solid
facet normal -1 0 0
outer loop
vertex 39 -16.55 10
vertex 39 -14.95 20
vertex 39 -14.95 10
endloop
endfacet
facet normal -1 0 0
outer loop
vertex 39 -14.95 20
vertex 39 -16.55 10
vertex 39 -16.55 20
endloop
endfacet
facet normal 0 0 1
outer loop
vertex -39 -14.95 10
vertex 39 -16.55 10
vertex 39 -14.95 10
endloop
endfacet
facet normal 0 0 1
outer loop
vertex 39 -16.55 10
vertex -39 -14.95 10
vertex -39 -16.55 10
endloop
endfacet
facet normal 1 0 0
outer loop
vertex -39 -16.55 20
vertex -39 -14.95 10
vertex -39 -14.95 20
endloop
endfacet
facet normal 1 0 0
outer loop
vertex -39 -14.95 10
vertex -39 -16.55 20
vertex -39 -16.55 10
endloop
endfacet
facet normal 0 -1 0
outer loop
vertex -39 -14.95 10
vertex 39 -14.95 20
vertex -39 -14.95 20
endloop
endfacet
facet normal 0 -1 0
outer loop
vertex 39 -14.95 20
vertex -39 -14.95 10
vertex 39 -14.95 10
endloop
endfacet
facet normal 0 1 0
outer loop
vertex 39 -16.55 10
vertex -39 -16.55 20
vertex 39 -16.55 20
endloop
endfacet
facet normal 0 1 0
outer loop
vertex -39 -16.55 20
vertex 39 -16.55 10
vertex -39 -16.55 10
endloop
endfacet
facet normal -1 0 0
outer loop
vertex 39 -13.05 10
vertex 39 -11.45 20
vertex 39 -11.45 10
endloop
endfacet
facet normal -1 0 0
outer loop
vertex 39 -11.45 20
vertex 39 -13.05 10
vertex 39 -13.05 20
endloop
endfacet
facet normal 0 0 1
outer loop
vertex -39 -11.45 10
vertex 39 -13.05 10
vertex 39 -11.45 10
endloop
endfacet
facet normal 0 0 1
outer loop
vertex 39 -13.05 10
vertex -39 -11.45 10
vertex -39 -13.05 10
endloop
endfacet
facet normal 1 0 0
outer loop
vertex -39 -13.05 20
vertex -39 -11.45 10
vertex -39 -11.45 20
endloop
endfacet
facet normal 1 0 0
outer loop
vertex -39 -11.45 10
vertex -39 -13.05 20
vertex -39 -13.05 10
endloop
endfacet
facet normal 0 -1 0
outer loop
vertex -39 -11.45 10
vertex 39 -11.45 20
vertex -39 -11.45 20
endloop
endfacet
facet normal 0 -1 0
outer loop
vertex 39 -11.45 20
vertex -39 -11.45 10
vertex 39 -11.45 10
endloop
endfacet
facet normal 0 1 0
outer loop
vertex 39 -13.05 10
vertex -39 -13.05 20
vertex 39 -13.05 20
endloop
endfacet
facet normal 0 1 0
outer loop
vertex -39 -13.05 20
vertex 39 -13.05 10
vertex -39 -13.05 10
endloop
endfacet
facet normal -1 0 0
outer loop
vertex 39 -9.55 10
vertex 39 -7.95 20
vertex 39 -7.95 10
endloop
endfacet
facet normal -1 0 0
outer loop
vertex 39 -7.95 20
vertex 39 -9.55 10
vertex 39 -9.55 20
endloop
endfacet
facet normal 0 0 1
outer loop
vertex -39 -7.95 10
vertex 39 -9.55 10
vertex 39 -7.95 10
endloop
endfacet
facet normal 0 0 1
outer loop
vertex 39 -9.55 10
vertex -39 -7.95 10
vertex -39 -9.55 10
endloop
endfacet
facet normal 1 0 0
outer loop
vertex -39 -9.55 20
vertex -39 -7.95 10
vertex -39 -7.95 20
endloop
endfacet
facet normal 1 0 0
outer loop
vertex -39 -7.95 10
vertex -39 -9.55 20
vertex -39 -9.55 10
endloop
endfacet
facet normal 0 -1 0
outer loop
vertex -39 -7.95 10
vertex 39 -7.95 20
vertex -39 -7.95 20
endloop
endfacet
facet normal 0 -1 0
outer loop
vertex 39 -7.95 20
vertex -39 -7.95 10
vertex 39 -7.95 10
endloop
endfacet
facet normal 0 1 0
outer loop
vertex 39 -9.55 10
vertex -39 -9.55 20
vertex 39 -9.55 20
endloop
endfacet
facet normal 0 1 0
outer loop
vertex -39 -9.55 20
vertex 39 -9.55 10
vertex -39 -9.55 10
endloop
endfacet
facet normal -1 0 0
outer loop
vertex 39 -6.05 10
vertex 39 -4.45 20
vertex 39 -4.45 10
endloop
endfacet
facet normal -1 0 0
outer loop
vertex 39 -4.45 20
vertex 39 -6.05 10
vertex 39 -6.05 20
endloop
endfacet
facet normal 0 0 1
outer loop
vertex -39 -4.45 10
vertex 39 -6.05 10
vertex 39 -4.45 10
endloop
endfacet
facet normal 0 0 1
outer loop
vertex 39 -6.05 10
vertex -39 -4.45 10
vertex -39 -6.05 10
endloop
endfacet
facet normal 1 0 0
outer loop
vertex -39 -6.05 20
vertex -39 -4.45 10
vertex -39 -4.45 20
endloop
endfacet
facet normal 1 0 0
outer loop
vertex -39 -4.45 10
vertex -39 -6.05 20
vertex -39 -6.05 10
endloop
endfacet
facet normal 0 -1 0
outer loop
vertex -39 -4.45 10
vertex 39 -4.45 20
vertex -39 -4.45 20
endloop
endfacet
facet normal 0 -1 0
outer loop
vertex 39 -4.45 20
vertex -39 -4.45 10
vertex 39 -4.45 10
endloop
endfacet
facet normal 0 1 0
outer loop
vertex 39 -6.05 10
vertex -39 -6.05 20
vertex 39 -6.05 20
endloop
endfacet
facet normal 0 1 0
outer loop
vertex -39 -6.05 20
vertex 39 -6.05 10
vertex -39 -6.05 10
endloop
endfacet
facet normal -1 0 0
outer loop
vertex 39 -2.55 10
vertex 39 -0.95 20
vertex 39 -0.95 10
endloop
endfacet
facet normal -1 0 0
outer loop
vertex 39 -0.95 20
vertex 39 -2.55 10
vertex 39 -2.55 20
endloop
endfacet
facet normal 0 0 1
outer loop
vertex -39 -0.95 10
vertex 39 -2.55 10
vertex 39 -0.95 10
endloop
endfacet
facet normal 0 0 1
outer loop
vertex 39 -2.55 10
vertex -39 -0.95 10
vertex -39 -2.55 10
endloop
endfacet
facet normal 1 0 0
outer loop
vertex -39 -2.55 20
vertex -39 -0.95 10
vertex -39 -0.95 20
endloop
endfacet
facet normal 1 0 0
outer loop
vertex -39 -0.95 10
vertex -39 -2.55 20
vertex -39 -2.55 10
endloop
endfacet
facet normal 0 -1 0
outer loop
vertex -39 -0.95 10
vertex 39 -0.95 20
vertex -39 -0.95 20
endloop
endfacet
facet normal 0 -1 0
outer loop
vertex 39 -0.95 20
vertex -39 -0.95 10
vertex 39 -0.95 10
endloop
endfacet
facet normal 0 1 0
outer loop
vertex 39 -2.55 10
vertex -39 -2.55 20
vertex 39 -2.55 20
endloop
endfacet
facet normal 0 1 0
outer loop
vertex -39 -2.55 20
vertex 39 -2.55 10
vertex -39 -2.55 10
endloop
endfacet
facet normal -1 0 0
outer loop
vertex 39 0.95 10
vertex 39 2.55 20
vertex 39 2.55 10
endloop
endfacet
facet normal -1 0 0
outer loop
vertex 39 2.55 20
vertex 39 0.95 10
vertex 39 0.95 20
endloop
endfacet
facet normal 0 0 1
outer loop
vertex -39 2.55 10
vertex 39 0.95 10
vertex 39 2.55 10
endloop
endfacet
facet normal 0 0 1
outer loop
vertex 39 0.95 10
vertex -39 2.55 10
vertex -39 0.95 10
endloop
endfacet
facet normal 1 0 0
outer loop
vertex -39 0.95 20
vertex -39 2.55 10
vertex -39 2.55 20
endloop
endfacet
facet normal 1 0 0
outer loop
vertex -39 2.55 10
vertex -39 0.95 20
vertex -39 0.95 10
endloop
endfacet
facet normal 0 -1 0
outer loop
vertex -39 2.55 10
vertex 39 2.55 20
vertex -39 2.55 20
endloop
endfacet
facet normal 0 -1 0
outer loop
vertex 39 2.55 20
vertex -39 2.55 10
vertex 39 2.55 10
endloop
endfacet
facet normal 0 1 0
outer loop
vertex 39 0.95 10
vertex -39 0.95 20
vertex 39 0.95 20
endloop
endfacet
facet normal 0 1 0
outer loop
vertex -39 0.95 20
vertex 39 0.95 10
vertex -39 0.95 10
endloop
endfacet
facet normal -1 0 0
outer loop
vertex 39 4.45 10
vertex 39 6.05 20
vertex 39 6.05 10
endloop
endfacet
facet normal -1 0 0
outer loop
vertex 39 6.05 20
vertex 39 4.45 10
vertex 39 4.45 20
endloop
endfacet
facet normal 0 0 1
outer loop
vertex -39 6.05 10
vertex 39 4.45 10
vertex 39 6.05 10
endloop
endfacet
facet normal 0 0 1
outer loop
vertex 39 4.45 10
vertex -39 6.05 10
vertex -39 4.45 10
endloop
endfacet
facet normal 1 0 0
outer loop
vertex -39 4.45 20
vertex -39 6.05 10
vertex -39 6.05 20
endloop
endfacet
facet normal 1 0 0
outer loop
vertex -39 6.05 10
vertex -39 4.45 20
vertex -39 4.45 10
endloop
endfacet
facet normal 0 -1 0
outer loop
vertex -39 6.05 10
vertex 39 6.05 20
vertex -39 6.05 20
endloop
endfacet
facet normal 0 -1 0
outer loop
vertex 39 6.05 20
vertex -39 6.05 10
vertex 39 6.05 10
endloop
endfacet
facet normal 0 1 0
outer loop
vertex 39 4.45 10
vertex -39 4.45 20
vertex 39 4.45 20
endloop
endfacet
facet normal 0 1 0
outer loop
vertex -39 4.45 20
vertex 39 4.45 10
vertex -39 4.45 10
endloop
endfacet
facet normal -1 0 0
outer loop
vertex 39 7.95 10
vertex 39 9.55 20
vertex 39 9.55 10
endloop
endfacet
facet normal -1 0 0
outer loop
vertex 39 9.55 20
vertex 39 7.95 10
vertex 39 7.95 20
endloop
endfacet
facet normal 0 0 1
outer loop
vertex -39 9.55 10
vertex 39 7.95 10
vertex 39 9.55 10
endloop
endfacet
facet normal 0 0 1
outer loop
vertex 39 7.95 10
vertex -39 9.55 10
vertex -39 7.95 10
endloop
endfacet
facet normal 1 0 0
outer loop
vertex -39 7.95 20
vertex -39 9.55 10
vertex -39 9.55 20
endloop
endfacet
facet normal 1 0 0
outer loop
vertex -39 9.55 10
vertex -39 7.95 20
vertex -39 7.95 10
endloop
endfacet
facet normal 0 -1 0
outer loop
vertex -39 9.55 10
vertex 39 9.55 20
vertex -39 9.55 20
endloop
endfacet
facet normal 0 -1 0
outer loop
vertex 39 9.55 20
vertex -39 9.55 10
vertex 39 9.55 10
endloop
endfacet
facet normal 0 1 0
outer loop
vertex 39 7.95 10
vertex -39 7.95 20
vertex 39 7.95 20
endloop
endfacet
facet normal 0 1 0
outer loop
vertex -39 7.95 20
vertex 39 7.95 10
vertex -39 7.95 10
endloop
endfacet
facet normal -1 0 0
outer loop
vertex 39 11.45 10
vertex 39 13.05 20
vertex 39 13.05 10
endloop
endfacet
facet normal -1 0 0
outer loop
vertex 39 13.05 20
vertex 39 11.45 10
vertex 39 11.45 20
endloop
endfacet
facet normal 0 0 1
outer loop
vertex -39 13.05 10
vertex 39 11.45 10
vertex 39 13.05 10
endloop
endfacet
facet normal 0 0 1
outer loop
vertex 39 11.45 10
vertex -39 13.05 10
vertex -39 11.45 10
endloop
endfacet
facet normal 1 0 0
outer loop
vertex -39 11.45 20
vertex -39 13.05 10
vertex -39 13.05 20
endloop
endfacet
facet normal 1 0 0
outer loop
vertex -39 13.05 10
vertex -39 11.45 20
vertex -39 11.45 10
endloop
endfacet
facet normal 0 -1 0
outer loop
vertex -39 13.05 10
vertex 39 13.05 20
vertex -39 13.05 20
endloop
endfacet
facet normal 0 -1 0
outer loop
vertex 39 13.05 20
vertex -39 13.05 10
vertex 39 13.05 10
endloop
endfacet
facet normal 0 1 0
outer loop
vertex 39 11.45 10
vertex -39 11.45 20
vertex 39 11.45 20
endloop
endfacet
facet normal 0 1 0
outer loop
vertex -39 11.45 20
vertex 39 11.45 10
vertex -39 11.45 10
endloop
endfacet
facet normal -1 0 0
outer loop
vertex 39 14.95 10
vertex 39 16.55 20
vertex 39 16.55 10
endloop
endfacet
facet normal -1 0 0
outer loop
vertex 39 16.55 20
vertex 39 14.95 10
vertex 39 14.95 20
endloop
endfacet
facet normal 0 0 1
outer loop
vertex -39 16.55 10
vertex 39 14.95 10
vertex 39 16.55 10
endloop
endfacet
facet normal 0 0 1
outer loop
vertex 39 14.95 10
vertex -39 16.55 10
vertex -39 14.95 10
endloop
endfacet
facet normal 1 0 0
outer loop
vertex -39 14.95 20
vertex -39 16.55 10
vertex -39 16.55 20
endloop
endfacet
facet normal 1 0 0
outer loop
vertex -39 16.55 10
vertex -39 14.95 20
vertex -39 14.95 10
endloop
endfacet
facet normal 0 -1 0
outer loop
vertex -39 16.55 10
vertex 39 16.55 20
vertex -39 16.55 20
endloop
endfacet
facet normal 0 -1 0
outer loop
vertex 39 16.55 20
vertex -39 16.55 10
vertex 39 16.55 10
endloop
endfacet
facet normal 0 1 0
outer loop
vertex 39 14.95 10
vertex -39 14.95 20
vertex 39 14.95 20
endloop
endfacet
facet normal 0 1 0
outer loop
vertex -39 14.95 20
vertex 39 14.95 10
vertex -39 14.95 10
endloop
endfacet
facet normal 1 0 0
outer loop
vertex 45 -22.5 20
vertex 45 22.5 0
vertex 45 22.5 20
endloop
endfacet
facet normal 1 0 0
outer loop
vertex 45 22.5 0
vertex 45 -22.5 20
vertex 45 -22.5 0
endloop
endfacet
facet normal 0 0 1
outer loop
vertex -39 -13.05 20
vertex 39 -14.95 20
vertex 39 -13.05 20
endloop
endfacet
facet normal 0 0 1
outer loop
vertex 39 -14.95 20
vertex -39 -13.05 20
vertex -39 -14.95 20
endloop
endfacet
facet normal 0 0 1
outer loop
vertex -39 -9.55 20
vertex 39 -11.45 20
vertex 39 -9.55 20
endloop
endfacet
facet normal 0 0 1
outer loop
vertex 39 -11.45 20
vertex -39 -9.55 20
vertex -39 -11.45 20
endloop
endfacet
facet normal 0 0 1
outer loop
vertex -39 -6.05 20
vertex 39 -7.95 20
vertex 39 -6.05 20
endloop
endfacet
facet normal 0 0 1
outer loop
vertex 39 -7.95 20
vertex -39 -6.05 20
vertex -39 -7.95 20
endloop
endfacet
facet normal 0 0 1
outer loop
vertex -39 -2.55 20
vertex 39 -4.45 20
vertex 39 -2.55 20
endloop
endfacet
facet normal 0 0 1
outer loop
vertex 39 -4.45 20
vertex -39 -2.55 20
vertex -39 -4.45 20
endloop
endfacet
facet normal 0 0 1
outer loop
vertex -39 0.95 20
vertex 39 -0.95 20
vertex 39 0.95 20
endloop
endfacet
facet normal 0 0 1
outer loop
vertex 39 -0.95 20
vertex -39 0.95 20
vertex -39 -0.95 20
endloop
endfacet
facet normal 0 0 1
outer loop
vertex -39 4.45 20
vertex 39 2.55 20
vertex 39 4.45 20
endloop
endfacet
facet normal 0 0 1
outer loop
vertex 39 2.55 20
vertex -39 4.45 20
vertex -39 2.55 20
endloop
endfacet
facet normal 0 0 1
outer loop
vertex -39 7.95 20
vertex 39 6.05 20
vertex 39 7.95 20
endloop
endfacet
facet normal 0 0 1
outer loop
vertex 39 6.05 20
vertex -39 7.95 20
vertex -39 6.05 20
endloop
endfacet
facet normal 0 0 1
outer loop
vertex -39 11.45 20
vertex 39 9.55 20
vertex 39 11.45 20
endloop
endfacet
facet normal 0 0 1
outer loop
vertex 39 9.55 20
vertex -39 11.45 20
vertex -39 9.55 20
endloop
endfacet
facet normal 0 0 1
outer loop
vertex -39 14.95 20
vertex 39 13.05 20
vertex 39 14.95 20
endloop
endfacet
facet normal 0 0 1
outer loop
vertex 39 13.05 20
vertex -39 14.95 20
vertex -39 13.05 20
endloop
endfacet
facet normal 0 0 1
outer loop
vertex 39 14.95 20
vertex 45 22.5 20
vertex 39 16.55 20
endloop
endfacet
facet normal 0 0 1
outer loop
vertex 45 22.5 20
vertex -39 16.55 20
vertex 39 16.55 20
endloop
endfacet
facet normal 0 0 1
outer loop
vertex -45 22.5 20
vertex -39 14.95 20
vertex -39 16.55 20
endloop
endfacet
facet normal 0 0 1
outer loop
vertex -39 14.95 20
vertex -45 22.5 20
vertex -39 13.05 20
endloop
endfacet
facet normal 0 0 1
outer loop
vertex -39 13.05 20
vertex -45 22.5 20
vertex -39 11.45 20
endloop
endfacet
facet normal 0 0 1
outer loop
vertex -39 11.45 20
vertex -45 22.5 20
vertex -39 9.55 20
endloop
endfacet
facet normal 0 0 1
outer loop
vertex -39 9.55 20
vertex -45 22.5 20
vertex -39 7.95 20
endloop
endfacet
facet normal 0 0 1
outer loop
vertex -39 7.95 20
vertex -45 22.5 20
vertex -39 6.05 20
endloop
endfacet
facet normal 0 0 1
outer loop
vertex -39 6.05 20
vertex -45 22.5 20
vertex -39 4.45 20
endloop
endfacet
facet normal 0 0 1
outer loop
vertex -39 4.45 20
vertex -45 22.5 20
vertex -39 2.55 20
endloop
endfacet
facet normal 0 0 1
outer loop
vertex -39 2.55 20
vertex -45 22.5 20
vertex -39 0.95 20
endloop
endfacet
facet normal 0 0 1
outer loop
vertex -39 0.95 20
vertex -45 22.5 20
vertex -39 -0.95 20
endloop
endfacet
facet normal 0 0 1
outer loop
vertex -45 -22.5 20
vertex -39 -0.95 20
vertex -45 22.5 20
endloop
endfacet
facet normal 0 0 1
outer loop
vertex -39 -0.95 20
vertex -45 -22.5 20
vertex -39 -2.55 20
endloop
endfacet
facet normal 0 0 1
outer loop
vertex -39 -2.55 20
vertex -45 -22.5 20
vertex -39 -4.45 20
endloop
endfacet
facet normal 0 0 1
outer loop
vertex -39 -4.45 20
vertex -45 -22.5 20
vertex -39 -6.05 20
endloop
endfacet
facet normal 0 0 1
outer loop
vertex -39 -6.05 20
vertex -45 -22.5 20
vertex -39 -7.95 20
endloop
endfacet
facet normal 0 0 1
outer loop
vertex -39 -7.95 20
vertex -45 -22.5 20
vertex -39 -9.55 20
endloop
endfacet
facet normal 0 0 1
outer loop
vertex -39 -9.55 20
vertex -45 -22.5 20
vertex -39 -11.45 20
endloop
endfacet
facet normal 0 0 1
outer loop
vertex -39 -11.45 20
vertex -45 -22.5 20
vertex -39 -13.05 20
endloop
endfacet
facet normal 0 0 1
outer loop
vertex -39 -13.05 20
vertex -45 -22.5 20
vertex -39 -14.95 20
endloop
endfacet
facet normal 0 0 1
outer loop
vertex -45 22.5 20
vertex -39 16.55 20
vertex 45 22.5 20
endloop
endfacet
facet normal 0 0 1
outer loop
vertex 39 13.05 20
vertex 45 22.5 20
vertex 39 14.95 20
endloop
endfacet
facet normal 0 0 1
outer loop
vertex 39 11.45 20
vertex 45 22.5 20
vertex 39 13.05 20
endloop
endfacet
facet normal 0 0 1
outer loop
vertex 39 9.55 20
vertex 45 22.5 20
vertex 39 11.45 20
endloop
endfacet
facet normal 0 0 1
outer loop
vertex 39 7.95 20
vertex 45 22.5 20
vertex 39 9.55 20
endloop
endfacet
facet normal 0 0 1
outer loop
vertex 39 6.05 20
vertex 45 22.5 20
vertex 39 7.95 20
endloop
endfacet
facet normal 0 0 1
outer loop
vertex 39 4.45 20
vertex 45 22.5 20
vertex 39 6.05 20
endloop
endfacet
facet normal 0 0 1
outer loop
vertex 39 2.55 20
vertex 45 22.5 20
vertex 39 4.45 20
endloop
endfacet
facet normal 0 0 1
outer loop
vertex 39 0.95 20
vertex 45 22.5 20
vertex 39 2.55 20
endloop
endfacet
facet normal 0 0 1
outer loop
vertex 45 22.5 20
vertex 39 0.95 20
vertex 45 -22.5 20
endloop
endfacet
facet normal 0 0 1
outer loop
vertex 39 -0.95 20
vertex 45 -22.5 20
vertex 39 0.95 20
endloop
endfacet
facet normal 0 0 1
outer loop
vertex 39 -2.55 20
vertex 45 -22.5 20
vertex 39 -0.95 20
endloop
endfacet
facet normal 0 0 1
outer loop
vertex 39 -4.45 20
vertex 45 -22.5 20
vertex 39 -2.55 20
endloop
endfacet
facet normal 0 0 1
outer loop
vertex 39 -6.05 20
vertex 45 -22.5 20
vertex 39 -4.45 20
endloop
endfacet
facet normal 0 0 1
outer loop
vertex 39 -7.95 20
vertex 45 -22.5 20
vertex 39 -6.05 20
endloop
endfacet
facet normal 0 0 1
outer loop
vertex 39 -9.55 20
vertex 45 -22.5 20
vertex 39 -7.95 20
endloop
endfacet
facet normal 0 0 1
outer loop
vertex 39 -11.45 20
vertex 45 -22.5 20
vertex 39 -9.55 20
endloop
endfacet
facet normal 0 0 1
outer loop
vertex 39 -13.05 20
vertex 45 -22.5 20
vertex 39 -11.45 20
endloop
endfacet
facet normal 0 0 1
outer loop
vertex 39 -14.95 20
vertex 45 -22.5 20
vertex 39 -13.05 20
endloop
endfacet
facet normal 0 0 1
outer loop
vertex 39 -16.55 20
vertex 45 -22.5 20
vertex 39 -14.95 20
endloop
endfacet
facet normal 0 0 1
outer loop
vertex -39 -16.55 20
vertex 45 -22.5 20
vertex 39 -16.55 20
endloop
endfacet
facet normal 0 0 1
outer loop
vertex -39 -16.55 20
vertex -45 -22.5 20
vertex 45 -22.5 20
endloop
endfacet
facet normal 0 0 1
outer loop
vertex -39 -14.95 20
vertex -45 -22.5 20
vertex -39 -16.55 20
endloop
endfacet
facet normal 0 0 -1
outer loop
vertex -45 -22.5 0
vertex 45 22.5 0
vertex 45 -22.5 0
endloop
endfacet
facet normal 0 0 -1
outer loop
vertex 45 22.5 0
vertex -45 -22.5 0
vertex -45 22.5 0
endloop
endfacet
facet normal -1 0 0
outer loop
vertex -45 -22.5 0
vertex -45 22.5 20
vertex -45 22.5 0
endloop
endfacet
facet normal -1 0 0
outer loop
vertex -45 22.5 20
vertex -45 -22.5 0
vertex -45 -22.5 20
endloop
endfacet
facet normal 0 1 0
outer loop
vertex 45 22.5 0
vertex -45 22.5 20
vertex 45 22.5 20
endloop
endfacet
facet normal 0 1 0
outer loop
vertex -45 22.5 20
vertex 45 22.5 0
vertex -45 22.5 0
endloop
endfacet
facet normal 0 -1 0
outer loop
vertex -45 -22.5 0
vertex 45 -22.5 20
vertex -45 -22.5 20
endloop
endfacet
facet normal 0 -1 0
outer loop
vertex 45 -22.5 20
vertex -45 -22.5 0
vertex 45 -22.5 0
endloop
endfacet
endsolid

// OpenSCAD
// Slide drying rack - holds 10 microscope slides standing upright on their long edge
// Print orientation: base block on the bed (z = 0), slots open upward (+Z)

// ---------------- Parameters ----------------
block_len    = 90;    // base block length along X (mm)
block_wid    = 45;    // base block width along Y (mm)
block_h      = 20;    // base block height along Z (mm)

slot_count   = 10;    // number of slide slots
slot_len     = 77;    // slot length along X (mm)
slot_w       = 1.6;   // slot width along Y (mm)
slot_depth   = 10;    // slot depth from top face (mm)
slot_pitch   = 3.5;   // centre-to-centre slot spacing along Y (mm)

eps          = 0.5;   // overshoot of cutters past the top face (mm)

$fn = 64;

// ---------------- Model ----------------
difference() {
    // Base block, centred in X and Y, resting on z = 0
    translate([-block_len/2, -block_wid/2, 0])
        cube([block_len, block_wid, block_h]);

    // Parallel slot group, centred on the block in X and Y
    for (i = [0 : slot_count - 1]) {
        x_c = (i - (slot_count - 1)/2) * slot_pitch;   // slot centre in Y
        translate([-(slot_len/2 + eps), x_c - slot_w/2, block_h - slot_depth])
            cube([slot_len + 2*eps, slot_w, slot_depth + eps]);
    }
}
